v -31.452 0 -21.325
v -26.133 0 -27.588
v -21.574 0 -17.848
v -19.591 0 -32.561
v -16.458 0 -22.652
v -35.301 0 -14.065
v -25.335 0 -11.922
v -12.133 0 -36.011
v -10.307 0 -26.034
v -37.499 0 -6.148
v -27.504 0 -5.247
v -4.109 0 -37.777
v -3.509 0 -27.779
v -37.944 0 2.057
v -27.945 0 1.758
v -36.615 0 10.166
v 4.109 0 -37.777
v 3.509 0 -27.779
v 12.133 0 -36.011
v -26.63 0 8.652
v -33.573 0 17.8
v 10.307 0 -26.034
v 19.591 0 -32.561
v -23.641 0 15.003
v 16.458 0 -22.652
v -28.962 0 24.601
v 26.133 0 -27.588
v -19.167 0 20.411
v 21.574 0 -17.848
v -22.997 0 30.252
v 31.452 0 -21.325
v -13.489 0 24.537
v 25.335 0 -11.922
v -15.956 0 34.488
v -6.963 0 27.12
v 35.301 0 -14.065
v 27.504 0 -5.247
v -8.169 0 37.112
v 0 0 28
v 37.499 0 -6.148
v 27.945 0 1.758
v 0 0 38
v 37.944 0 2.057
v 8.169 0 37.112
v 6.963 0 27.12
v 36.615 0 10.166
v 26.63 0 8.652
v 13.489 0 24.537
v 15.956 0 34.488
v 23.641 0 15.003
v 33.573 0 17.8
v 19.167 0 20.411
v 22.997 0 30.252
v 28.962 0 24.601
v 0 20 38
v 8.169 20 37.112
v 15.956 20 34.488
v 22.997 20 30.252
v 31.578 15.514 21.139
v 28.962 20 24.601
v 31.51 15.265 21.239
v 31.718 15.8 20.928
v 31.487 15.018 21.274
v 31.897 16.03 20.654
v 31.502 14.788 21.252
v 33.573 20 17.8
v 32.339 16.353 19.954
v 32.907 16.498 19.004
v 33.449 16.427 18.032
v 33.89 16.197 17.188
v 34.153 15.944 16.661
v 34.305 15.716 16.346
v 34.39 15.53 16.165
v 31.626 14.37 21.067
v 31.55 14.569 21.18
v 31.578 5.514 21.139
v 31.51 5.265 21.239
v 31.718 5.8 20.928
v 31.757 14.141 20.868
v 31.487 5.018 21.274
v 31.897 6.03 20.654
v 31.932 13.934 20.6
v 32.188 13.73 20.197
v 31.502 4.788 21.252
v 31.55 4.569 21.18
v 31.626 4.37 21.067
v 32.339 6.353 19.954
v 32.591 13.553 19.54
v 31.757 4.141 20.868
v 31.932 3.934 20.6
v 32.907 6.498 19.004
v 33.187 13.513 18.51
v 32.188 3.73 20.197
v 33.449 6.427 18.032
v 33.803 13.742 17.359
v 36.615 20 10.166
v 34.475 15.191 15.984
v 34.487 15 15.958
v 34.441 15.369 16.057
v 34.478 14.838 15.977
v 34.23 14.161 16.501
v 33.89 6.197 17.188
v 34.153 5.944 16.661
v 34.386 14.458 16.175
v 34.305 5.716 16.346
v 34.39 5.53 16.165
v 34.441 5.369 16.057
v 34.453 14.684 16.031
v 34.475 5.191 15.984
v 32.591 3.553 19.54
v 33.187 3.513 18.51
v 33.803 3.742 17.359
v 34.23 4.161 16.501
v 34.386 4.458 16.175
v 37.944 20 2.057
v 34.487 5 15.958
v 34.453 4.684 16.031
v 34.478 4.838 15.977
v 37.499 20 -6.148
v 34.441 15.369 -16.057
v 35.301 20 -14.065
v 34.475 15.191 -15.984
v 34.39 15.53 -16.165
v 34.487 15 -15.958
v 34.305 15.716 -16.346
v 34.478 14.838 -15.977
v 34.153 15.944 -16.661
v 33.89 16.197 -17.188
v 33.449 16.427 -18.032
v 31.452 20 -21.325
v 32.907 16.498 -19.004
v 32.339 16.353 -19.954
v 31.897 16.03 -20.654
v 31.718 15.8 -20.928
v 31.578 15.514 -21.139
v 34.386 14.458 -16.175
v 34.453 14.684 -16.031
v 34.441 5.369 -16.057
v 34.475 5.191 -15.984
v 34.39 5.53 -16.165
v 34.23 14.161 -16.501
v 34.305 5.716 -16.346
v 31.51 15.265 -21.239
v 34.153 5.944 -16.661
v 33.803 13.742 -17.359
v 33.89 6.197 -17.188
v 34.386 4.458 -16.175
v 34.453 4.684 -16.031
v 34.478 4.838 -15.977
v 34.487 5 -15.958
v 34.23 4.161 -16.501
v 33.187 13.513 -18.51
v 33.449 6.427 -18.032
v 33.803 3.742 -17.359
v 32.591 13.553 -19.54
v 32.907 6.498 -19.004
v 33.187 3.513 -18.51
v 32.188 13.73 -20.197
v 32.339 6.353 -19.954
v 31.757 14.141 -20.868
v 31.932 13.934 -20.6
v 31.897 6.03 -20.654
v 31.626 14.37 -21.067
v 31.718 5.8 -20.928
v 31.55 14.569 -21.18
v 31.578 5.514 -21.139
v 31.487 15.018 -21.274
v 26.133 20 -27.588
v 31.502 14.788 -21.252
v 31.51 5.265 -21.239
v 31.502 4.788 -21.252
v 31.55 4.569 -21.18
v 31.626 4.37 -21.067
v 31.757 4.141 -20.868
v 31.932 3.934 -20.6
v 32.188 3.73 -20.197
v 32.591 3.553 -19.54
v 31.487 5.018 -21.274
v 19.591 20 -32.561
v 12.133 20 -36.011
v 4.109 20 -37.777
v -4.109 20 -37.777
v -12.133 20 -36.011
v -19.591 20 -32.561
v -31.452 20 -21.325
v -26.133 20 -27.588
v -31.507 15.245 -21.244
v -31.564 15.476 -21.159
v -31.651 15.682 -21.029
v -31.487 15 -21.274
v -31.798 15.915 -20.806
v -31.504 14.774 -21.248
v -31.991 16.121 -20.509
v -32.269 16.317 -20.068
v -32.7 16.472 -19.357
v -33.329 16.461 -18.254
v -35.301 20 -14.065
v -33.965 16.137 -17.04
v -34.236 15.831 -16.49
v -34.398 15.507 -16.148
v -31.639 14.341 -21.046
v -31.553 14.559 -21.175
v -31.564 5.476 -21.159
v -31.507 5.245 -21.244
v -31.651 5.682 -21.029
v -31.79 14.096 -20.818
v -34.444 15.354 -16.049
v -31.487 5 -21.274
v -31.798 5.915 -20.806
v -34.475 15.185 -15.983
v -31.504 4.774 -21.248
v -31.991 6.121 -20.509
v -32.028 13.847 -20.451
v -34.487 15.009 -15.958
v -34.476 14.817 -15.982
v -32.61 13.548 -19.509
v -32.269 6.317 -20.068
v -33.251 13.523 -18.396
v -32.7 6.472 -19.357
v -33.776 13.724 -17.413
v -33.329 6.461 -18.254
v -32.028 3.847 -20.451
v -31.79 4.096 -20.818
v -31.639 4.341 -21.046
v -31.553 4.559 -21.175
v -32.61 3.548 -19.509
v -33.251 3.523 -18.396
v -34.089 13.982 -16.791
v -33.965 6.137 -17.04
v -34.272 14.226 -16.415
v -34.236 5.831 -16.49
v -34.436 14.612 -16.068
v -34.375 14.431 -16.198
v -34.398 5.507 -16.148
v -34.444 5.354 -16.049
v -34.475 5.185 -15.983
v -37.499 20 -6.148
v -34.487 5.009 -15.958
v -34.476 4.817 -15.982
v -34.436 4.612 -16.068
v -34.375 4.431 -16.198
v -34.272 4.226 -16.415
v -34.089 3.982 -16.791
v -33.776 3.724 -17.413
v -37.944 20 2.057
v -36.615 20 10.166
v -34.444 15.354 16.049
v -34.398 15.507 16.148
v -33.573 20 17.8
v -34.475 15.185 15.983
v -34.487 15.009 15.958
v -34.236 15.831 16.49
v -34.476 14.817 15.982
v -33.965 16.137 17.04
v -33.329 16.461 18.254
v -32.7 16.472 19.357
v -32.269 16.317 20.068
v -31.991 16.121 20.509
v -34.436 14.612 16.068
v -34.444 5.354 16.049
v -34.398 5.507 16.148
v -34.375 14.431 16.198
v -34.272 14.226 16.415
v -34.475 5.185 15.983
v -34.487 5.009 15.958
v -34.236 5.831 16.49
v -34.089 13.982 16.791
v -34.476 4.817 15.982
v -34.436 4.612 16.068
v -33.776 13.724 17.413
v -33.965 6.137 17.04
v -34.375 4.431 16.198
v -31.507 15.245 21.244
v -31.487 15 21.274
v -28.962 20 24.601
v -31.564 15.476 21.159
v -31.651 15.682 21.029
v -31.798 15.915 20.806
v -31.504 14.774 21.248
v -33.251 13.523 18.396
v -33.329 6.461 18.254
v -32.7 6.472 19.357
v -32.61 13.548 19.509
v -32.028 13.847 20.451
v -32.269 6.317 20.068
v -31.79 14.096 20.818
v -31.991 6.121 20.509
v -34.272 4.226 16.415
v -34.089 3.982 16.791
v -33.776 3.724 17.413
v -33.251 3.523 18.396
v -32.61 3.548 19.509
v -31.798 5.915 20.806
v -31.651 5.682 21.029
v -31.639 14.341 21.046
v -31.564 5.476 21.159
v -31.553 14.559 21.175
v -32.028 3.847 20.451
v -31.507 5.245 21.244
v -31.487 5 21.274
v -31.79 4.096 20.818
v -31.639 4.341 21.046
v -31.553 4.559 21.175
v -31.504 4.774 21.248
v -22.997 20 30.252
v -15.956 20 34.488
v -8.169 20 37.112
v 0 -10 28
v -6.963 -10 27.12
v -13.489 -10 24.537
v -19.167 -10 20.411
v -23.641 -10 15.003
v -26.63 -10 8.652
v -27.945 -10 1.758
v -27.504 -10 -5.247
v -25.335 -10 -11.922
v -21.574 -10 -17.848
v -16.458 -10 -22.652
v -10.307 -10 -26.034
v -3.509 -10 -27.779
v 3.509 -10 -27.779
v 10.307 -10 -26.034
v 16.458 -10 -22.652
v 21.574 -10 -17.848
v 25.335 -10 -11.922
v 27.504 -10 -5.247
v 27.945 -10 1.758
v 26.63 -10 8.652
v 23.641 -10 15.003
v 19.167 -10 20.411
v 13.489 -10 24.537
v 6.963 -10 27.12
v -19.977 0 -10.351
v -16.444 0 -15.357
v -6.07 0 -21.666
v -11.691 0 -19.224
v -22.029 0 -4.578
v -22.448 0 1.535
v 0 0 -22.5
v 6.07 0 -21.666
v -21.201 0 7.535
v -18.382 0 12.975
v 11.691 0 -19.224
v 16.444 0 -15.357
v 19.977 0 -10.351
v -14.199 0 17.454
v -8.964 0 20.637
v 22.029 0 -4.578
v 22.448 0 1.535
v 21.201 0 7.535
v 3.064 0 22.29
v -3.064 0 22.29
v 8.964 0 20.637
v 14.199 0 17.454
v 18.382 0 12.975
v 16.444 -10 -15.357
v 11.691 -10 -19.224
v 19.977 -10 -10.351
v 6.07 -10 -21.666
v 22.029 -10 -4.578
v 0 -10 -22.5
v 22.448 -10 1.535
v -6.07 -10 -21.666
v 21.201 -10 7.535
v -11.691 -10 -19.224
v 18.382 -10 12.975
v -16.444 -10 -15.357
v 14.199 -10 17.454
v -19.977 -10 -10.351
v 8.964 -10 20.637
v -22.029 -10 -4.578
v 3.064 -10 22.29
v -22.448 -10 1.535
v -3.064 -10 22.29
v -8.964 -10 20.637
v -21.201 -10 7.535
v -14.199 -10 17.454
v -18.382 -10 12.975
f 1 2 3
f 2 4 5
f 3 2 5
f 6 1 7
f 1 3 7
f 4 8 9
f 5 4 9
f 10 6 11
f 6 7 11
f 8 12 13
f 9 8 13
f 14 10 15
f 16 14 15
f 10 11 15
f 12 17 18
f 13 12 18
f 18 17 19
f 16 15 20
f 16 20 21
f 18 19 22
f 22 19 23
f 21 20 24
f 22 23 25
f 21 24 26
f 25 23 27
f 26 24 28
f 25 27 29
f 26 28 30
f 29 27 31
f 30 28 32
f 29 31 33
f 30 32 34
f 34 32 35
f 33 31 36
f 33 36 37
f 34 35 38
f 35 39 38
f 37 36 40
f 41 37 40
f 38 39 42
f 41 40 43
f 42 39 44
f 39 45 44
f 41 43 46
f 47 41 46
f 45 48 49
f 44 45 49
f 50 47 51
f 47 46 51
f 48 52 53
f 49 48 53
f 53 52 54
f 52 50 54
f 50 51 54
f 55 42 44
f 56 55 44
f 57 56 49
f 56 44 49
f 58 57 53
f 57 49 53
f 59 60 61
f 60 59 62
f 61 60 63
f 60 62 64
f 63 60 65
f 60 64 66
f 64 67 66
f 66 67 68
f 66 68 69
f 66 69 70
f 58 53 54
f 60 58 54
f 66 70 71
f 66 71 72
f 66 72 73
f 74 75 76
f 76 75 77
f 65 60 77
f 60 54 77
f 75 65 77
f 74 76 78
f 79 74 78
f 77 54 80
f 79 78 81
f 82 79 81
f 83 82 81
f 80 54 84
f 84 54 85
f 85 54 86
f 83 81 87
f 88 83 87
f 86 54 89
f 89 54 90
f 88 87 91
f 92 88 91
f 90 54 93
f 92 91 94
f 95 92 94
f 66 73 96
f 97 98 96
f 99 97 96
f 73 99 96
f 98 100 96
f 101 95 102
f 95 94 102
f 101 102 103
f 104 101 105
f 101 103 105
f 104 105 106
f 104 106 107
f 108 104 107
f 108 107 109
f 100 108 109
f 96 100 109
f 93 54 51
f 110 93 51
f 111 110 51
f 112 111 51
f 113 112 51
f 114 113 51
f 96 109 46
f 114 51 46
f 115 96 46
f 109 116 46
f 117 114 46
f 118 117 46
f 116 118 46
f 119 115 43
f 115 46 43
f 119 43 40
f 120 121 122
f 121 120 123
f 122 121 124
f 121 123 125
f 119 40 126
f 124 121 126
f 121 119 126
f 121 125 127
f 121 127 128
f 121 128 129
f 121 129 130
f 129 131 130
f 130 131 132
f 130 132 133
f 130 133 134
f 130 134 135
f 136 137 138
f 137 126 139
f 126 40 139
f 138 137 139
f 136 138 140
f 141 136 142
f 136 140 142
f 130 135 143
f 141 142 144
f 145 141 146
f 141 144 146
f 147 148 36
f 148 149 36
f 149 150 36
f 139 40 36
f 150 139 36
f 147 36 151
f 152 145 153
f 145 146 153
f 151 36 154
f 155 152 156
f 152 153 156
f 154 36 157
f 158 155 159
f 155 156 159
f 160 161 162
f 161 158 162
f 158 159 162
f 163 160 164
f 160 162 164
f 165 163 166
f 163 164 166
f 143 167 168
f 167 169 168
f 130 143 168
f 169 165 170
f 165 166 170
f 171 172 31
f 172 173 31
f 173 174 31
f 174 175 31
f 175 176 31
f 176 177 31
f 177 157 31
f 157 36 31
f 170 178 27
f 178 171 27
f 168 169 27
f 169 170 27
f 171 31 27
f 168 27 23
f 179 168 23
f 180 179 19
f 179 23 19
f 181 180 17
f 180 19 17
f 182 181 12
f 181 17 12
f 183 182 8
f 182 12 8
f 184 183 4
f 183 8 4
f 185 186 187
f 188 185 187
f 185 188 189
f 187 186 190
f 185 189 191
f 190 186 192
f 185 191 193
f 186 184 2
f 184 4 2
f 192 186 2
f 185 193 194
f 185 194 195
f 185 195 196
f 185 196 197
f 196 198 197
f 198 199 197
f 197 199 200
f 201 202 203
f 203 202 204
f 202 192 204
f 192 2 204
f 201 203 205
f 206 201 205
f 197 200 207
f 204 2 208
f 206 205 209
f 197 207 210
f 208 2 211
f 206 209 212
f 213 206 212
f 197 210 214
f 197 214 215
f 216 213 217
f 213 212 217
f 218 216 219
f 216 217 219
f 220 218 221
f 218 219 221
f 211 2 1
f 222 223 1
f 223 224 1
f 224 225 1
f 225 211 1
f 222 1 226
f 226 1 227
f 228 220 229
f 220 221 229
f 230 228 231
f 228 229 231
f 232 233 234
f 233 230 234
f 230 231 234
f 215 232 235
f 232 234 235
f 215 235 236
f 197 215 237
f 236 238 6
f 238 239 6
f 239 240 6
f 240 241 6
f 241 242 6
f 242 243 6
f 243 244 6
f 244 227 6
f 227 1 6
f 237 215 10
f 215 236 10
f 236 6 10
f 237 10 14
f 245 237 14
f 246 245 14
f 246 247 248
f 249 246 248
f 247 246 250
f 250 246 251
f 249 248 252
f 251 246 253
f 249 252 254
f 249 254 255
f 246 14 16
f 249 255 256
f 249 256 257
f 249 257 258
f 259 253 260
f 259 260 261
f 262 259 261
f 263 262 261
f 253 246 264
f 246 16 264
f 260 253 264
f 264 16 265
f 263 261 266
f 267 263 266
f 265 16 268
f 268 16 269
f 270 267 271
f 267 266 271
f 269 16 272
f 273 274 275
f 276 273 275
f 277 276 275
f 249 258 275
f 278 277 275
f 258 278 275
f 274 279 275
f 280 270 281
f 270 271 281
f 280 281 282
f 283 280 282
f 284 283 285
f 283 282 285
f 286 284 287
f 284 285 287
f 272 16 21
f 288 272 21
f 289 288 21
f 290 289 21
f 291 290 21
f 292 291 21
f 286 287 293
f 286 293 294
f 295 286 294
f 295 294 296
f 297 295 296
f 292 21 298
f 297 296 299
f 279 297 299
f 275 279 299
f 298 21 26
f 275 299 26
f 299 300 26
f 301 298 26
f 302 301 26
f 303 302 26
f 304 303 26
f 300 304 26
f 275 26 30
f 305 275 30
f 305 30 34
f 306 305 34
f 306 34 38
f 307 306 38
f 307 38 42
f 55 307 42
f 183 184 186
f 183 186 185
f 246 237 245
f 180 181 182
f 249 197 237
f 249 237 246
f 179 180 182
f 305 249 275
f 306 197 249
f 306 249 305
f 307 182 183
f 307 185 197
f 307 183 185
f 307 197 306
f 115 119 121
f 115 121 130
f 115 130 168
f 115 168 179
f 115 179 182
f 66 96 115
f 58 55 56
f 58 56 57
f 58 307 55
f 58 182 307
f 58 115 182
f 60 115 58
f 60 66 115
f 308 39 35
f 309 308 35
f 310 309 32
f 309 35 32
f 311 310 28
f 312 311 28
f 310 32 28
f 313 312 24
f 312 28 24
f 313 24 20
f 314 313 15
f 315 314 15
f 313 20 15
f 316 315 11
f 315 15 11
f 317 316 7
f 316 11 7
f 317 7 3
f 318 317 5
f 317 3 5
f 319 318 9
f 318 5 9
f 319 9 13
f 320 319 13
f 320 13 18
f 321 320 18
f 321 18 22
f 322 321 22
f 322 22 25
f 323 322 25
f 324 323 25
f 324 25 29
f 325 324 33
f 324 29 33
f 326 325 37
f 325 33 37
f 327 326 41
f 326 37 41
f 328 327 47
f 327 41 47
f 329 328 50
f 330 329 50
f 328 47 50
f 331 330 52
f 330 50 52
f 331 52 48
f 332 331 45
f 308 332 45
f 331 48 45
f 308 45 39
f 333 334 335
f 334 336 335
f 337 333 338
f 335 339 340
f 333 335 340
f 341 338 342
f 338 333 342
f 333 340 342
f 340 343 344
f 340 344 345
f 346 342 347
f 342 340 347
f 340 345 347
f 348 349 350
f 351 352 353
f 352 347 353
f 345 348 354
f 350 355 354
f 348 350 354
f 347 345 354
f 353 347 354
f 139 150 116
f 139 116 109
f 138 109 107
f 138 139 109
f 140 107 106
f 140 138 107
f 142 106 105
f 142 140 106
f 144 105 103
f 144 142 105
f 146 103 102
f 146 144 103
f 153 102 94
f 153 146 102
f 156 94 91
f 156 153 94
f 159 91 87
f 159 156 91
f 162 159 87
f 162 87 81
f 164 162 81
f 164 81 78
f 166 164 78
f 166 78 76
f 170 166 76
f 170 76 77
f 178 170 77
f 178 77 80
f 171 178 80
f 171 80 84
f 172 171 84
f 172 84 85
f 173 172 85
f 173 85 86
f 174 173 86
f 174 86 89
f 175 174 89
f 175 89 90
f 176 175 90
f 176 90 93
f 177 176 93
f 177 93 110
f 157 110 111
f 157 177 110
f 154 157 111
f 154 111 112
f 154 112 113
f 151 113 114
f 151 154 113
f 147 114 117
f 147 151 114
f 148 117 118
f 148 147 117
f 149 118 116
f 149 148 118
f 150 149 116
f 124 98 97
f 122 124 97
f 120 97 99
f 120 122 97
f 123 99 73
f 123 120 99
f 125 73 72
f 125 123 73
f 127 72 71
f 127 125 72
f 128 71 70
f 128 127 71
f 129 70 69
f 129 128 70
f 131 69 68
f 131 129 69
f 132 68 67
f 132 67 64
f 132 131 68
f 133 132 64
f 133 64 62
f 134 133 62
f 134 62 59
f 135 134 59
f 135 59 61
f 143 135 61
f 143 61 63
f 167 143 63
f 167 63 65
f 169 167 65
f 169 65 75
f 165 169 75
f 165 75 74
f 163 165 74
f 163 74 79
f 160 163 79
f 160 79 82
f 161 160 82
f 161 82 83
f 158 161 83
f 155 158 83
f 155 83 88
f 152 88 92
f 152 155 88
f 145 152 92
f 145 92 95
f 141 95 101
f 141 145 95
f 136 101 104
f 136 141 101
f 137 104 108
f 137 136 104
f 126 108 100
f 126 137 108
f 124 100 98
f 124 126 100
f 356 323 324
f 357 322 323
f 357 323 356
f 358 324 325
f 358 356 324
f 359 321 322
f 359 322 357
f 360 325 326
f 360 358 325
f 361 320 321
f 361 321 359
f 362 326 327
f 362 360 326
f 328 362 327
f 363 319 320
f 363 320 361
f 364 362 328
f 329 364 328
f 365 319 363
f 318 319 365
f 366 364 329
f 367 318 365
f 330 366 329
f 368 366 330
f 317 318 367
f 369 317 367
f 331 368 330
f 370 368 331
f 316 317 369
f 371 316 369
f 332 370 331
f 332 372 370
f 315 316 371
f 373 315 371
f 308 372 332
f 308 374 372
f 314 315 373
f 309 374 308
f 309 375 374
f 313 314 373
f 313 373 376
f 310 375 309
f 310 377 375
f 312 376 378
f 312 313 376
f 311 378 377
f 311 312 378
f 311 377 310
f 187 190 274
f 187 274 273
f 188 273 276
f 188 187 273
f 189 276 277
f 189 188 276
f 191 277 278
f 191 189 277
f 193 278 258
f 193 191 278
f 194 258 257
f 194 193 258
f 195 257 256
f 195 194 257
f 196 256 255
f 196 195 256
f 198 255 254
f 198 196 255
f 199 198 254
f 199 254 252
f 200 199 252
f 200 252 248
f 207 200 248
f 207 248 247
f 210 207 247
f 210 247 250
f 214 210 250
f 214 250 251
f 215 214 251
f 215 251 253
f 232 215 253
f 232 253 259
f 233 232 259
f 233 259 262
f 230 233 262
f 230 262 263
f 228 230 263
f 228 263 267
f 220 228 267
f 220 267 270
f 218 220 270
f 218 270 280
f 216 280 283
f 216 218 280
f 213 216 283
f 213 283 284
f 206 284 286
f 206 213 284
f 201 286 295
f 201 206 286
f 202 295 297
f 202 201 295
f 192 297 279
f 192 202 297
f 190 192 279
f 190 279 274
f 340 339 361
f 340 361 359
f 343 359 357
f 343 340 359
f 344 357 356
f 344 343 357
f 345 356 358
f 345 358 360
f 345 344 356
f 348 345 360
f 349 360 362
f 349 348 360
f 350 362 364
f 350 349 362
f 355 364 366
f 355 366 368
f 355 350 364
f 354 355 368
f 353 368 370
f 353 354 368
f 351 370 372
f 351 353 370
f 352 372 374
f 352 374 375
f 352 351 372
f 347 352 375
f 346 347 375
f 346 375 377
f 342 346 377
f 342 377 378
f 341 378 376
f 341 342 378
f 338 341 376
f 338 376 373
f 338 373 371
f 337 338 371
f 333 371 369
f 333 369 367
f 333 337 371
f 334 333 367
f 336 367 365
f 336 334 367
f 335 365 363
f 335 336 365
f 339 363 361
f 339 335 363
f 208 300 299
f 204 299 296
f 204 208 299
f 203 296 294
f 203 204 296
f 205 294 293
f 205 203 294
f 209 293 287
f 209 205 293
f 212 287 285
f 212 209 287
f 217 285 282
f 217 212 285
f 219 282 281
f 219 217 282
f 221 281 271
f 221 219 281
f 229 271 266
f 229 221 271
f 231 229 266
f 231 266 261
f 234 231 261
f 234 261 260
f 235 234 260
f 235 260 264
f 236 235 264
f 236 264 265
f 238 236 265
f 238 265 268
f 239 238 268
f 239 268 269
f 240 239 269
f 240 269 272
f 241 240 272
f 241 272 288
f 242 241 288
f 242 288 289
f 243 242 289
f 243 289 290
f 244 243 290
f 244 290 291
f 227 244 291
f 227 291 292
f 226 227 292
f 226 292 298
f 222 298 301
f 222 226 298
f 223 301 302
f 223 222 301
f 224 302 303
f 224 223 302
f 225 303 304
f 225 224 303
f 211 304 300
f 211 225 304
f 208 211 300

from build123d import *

# Parameters (mm, degrees)
SKETCH1_R               = 38
BOSS_EXTRUDE1_DEPTH     = 20
SKETCH2_R               = 28
SKETCH2_R_2             = 22.5
BOSS_EXTRUDE2_DEPTH     = 10
CUT_EXTRUDE1_DEPTH      = 58.341084747
CUT_EXTRUDE1_DEPTH_BACK = 58.341084747
SKETCH3_R               = 1.5


with BuildPart() as part:
    # Sketch1 → Boss-Extrude1 (new body)
    with BuildSketch(Plane(origin=(0, 0, 0), x_dir=(1, 0, 0), z_dir=(0, 1, 0))):
        with Locations(Location((0, 0, 0), (0, 0, 270))):
            Circle(SKETCH1_R)
    extrude(amount=BOSS_EXTRUDE1_DEPTH)

    # Sketch2 → Boss-Extrude2 (add)
    with BuildSketch(Plane.XZ):
        with Locations(Location((0, 0, 0), (0, 0, 90))):
            Circle(SKETCH2_R)
        with Locations(Location((0, 0, 0), (0, 0, 270))):
            Circle(SKETCH2_R_2, mode=Mode.SUBTRACT)
    extrude(amount=BOSS_EXTRUDE2_DEPTH)

    # Sketch3 → Cut-Extrude1 (cut, two sides: drawn at the far end of the back side and taken through both)
    with BuildSketch(Plane.XY.offset(-CUT_EXTRUDE1_DEPTH_BACK)):
        with Locations((32.986839826, 5)):
            Circle(SKETCH3_R)
        with Locations((32.986839826, 15)):
            Circle(SKETCH3_R)
        with Locations((-32.986839826, 5)):
            Circle(SKETCH3_R)
        with Locations((-32.986839826, 15)):
            Circle(SKETCH3_R)
    extrude(amount=CUT_EXTRUDE1_DEPTH + CUT_EXTRUDE1_DEPTH_BACK, mode=Mode.SUBTRACT)


solid = part.part
